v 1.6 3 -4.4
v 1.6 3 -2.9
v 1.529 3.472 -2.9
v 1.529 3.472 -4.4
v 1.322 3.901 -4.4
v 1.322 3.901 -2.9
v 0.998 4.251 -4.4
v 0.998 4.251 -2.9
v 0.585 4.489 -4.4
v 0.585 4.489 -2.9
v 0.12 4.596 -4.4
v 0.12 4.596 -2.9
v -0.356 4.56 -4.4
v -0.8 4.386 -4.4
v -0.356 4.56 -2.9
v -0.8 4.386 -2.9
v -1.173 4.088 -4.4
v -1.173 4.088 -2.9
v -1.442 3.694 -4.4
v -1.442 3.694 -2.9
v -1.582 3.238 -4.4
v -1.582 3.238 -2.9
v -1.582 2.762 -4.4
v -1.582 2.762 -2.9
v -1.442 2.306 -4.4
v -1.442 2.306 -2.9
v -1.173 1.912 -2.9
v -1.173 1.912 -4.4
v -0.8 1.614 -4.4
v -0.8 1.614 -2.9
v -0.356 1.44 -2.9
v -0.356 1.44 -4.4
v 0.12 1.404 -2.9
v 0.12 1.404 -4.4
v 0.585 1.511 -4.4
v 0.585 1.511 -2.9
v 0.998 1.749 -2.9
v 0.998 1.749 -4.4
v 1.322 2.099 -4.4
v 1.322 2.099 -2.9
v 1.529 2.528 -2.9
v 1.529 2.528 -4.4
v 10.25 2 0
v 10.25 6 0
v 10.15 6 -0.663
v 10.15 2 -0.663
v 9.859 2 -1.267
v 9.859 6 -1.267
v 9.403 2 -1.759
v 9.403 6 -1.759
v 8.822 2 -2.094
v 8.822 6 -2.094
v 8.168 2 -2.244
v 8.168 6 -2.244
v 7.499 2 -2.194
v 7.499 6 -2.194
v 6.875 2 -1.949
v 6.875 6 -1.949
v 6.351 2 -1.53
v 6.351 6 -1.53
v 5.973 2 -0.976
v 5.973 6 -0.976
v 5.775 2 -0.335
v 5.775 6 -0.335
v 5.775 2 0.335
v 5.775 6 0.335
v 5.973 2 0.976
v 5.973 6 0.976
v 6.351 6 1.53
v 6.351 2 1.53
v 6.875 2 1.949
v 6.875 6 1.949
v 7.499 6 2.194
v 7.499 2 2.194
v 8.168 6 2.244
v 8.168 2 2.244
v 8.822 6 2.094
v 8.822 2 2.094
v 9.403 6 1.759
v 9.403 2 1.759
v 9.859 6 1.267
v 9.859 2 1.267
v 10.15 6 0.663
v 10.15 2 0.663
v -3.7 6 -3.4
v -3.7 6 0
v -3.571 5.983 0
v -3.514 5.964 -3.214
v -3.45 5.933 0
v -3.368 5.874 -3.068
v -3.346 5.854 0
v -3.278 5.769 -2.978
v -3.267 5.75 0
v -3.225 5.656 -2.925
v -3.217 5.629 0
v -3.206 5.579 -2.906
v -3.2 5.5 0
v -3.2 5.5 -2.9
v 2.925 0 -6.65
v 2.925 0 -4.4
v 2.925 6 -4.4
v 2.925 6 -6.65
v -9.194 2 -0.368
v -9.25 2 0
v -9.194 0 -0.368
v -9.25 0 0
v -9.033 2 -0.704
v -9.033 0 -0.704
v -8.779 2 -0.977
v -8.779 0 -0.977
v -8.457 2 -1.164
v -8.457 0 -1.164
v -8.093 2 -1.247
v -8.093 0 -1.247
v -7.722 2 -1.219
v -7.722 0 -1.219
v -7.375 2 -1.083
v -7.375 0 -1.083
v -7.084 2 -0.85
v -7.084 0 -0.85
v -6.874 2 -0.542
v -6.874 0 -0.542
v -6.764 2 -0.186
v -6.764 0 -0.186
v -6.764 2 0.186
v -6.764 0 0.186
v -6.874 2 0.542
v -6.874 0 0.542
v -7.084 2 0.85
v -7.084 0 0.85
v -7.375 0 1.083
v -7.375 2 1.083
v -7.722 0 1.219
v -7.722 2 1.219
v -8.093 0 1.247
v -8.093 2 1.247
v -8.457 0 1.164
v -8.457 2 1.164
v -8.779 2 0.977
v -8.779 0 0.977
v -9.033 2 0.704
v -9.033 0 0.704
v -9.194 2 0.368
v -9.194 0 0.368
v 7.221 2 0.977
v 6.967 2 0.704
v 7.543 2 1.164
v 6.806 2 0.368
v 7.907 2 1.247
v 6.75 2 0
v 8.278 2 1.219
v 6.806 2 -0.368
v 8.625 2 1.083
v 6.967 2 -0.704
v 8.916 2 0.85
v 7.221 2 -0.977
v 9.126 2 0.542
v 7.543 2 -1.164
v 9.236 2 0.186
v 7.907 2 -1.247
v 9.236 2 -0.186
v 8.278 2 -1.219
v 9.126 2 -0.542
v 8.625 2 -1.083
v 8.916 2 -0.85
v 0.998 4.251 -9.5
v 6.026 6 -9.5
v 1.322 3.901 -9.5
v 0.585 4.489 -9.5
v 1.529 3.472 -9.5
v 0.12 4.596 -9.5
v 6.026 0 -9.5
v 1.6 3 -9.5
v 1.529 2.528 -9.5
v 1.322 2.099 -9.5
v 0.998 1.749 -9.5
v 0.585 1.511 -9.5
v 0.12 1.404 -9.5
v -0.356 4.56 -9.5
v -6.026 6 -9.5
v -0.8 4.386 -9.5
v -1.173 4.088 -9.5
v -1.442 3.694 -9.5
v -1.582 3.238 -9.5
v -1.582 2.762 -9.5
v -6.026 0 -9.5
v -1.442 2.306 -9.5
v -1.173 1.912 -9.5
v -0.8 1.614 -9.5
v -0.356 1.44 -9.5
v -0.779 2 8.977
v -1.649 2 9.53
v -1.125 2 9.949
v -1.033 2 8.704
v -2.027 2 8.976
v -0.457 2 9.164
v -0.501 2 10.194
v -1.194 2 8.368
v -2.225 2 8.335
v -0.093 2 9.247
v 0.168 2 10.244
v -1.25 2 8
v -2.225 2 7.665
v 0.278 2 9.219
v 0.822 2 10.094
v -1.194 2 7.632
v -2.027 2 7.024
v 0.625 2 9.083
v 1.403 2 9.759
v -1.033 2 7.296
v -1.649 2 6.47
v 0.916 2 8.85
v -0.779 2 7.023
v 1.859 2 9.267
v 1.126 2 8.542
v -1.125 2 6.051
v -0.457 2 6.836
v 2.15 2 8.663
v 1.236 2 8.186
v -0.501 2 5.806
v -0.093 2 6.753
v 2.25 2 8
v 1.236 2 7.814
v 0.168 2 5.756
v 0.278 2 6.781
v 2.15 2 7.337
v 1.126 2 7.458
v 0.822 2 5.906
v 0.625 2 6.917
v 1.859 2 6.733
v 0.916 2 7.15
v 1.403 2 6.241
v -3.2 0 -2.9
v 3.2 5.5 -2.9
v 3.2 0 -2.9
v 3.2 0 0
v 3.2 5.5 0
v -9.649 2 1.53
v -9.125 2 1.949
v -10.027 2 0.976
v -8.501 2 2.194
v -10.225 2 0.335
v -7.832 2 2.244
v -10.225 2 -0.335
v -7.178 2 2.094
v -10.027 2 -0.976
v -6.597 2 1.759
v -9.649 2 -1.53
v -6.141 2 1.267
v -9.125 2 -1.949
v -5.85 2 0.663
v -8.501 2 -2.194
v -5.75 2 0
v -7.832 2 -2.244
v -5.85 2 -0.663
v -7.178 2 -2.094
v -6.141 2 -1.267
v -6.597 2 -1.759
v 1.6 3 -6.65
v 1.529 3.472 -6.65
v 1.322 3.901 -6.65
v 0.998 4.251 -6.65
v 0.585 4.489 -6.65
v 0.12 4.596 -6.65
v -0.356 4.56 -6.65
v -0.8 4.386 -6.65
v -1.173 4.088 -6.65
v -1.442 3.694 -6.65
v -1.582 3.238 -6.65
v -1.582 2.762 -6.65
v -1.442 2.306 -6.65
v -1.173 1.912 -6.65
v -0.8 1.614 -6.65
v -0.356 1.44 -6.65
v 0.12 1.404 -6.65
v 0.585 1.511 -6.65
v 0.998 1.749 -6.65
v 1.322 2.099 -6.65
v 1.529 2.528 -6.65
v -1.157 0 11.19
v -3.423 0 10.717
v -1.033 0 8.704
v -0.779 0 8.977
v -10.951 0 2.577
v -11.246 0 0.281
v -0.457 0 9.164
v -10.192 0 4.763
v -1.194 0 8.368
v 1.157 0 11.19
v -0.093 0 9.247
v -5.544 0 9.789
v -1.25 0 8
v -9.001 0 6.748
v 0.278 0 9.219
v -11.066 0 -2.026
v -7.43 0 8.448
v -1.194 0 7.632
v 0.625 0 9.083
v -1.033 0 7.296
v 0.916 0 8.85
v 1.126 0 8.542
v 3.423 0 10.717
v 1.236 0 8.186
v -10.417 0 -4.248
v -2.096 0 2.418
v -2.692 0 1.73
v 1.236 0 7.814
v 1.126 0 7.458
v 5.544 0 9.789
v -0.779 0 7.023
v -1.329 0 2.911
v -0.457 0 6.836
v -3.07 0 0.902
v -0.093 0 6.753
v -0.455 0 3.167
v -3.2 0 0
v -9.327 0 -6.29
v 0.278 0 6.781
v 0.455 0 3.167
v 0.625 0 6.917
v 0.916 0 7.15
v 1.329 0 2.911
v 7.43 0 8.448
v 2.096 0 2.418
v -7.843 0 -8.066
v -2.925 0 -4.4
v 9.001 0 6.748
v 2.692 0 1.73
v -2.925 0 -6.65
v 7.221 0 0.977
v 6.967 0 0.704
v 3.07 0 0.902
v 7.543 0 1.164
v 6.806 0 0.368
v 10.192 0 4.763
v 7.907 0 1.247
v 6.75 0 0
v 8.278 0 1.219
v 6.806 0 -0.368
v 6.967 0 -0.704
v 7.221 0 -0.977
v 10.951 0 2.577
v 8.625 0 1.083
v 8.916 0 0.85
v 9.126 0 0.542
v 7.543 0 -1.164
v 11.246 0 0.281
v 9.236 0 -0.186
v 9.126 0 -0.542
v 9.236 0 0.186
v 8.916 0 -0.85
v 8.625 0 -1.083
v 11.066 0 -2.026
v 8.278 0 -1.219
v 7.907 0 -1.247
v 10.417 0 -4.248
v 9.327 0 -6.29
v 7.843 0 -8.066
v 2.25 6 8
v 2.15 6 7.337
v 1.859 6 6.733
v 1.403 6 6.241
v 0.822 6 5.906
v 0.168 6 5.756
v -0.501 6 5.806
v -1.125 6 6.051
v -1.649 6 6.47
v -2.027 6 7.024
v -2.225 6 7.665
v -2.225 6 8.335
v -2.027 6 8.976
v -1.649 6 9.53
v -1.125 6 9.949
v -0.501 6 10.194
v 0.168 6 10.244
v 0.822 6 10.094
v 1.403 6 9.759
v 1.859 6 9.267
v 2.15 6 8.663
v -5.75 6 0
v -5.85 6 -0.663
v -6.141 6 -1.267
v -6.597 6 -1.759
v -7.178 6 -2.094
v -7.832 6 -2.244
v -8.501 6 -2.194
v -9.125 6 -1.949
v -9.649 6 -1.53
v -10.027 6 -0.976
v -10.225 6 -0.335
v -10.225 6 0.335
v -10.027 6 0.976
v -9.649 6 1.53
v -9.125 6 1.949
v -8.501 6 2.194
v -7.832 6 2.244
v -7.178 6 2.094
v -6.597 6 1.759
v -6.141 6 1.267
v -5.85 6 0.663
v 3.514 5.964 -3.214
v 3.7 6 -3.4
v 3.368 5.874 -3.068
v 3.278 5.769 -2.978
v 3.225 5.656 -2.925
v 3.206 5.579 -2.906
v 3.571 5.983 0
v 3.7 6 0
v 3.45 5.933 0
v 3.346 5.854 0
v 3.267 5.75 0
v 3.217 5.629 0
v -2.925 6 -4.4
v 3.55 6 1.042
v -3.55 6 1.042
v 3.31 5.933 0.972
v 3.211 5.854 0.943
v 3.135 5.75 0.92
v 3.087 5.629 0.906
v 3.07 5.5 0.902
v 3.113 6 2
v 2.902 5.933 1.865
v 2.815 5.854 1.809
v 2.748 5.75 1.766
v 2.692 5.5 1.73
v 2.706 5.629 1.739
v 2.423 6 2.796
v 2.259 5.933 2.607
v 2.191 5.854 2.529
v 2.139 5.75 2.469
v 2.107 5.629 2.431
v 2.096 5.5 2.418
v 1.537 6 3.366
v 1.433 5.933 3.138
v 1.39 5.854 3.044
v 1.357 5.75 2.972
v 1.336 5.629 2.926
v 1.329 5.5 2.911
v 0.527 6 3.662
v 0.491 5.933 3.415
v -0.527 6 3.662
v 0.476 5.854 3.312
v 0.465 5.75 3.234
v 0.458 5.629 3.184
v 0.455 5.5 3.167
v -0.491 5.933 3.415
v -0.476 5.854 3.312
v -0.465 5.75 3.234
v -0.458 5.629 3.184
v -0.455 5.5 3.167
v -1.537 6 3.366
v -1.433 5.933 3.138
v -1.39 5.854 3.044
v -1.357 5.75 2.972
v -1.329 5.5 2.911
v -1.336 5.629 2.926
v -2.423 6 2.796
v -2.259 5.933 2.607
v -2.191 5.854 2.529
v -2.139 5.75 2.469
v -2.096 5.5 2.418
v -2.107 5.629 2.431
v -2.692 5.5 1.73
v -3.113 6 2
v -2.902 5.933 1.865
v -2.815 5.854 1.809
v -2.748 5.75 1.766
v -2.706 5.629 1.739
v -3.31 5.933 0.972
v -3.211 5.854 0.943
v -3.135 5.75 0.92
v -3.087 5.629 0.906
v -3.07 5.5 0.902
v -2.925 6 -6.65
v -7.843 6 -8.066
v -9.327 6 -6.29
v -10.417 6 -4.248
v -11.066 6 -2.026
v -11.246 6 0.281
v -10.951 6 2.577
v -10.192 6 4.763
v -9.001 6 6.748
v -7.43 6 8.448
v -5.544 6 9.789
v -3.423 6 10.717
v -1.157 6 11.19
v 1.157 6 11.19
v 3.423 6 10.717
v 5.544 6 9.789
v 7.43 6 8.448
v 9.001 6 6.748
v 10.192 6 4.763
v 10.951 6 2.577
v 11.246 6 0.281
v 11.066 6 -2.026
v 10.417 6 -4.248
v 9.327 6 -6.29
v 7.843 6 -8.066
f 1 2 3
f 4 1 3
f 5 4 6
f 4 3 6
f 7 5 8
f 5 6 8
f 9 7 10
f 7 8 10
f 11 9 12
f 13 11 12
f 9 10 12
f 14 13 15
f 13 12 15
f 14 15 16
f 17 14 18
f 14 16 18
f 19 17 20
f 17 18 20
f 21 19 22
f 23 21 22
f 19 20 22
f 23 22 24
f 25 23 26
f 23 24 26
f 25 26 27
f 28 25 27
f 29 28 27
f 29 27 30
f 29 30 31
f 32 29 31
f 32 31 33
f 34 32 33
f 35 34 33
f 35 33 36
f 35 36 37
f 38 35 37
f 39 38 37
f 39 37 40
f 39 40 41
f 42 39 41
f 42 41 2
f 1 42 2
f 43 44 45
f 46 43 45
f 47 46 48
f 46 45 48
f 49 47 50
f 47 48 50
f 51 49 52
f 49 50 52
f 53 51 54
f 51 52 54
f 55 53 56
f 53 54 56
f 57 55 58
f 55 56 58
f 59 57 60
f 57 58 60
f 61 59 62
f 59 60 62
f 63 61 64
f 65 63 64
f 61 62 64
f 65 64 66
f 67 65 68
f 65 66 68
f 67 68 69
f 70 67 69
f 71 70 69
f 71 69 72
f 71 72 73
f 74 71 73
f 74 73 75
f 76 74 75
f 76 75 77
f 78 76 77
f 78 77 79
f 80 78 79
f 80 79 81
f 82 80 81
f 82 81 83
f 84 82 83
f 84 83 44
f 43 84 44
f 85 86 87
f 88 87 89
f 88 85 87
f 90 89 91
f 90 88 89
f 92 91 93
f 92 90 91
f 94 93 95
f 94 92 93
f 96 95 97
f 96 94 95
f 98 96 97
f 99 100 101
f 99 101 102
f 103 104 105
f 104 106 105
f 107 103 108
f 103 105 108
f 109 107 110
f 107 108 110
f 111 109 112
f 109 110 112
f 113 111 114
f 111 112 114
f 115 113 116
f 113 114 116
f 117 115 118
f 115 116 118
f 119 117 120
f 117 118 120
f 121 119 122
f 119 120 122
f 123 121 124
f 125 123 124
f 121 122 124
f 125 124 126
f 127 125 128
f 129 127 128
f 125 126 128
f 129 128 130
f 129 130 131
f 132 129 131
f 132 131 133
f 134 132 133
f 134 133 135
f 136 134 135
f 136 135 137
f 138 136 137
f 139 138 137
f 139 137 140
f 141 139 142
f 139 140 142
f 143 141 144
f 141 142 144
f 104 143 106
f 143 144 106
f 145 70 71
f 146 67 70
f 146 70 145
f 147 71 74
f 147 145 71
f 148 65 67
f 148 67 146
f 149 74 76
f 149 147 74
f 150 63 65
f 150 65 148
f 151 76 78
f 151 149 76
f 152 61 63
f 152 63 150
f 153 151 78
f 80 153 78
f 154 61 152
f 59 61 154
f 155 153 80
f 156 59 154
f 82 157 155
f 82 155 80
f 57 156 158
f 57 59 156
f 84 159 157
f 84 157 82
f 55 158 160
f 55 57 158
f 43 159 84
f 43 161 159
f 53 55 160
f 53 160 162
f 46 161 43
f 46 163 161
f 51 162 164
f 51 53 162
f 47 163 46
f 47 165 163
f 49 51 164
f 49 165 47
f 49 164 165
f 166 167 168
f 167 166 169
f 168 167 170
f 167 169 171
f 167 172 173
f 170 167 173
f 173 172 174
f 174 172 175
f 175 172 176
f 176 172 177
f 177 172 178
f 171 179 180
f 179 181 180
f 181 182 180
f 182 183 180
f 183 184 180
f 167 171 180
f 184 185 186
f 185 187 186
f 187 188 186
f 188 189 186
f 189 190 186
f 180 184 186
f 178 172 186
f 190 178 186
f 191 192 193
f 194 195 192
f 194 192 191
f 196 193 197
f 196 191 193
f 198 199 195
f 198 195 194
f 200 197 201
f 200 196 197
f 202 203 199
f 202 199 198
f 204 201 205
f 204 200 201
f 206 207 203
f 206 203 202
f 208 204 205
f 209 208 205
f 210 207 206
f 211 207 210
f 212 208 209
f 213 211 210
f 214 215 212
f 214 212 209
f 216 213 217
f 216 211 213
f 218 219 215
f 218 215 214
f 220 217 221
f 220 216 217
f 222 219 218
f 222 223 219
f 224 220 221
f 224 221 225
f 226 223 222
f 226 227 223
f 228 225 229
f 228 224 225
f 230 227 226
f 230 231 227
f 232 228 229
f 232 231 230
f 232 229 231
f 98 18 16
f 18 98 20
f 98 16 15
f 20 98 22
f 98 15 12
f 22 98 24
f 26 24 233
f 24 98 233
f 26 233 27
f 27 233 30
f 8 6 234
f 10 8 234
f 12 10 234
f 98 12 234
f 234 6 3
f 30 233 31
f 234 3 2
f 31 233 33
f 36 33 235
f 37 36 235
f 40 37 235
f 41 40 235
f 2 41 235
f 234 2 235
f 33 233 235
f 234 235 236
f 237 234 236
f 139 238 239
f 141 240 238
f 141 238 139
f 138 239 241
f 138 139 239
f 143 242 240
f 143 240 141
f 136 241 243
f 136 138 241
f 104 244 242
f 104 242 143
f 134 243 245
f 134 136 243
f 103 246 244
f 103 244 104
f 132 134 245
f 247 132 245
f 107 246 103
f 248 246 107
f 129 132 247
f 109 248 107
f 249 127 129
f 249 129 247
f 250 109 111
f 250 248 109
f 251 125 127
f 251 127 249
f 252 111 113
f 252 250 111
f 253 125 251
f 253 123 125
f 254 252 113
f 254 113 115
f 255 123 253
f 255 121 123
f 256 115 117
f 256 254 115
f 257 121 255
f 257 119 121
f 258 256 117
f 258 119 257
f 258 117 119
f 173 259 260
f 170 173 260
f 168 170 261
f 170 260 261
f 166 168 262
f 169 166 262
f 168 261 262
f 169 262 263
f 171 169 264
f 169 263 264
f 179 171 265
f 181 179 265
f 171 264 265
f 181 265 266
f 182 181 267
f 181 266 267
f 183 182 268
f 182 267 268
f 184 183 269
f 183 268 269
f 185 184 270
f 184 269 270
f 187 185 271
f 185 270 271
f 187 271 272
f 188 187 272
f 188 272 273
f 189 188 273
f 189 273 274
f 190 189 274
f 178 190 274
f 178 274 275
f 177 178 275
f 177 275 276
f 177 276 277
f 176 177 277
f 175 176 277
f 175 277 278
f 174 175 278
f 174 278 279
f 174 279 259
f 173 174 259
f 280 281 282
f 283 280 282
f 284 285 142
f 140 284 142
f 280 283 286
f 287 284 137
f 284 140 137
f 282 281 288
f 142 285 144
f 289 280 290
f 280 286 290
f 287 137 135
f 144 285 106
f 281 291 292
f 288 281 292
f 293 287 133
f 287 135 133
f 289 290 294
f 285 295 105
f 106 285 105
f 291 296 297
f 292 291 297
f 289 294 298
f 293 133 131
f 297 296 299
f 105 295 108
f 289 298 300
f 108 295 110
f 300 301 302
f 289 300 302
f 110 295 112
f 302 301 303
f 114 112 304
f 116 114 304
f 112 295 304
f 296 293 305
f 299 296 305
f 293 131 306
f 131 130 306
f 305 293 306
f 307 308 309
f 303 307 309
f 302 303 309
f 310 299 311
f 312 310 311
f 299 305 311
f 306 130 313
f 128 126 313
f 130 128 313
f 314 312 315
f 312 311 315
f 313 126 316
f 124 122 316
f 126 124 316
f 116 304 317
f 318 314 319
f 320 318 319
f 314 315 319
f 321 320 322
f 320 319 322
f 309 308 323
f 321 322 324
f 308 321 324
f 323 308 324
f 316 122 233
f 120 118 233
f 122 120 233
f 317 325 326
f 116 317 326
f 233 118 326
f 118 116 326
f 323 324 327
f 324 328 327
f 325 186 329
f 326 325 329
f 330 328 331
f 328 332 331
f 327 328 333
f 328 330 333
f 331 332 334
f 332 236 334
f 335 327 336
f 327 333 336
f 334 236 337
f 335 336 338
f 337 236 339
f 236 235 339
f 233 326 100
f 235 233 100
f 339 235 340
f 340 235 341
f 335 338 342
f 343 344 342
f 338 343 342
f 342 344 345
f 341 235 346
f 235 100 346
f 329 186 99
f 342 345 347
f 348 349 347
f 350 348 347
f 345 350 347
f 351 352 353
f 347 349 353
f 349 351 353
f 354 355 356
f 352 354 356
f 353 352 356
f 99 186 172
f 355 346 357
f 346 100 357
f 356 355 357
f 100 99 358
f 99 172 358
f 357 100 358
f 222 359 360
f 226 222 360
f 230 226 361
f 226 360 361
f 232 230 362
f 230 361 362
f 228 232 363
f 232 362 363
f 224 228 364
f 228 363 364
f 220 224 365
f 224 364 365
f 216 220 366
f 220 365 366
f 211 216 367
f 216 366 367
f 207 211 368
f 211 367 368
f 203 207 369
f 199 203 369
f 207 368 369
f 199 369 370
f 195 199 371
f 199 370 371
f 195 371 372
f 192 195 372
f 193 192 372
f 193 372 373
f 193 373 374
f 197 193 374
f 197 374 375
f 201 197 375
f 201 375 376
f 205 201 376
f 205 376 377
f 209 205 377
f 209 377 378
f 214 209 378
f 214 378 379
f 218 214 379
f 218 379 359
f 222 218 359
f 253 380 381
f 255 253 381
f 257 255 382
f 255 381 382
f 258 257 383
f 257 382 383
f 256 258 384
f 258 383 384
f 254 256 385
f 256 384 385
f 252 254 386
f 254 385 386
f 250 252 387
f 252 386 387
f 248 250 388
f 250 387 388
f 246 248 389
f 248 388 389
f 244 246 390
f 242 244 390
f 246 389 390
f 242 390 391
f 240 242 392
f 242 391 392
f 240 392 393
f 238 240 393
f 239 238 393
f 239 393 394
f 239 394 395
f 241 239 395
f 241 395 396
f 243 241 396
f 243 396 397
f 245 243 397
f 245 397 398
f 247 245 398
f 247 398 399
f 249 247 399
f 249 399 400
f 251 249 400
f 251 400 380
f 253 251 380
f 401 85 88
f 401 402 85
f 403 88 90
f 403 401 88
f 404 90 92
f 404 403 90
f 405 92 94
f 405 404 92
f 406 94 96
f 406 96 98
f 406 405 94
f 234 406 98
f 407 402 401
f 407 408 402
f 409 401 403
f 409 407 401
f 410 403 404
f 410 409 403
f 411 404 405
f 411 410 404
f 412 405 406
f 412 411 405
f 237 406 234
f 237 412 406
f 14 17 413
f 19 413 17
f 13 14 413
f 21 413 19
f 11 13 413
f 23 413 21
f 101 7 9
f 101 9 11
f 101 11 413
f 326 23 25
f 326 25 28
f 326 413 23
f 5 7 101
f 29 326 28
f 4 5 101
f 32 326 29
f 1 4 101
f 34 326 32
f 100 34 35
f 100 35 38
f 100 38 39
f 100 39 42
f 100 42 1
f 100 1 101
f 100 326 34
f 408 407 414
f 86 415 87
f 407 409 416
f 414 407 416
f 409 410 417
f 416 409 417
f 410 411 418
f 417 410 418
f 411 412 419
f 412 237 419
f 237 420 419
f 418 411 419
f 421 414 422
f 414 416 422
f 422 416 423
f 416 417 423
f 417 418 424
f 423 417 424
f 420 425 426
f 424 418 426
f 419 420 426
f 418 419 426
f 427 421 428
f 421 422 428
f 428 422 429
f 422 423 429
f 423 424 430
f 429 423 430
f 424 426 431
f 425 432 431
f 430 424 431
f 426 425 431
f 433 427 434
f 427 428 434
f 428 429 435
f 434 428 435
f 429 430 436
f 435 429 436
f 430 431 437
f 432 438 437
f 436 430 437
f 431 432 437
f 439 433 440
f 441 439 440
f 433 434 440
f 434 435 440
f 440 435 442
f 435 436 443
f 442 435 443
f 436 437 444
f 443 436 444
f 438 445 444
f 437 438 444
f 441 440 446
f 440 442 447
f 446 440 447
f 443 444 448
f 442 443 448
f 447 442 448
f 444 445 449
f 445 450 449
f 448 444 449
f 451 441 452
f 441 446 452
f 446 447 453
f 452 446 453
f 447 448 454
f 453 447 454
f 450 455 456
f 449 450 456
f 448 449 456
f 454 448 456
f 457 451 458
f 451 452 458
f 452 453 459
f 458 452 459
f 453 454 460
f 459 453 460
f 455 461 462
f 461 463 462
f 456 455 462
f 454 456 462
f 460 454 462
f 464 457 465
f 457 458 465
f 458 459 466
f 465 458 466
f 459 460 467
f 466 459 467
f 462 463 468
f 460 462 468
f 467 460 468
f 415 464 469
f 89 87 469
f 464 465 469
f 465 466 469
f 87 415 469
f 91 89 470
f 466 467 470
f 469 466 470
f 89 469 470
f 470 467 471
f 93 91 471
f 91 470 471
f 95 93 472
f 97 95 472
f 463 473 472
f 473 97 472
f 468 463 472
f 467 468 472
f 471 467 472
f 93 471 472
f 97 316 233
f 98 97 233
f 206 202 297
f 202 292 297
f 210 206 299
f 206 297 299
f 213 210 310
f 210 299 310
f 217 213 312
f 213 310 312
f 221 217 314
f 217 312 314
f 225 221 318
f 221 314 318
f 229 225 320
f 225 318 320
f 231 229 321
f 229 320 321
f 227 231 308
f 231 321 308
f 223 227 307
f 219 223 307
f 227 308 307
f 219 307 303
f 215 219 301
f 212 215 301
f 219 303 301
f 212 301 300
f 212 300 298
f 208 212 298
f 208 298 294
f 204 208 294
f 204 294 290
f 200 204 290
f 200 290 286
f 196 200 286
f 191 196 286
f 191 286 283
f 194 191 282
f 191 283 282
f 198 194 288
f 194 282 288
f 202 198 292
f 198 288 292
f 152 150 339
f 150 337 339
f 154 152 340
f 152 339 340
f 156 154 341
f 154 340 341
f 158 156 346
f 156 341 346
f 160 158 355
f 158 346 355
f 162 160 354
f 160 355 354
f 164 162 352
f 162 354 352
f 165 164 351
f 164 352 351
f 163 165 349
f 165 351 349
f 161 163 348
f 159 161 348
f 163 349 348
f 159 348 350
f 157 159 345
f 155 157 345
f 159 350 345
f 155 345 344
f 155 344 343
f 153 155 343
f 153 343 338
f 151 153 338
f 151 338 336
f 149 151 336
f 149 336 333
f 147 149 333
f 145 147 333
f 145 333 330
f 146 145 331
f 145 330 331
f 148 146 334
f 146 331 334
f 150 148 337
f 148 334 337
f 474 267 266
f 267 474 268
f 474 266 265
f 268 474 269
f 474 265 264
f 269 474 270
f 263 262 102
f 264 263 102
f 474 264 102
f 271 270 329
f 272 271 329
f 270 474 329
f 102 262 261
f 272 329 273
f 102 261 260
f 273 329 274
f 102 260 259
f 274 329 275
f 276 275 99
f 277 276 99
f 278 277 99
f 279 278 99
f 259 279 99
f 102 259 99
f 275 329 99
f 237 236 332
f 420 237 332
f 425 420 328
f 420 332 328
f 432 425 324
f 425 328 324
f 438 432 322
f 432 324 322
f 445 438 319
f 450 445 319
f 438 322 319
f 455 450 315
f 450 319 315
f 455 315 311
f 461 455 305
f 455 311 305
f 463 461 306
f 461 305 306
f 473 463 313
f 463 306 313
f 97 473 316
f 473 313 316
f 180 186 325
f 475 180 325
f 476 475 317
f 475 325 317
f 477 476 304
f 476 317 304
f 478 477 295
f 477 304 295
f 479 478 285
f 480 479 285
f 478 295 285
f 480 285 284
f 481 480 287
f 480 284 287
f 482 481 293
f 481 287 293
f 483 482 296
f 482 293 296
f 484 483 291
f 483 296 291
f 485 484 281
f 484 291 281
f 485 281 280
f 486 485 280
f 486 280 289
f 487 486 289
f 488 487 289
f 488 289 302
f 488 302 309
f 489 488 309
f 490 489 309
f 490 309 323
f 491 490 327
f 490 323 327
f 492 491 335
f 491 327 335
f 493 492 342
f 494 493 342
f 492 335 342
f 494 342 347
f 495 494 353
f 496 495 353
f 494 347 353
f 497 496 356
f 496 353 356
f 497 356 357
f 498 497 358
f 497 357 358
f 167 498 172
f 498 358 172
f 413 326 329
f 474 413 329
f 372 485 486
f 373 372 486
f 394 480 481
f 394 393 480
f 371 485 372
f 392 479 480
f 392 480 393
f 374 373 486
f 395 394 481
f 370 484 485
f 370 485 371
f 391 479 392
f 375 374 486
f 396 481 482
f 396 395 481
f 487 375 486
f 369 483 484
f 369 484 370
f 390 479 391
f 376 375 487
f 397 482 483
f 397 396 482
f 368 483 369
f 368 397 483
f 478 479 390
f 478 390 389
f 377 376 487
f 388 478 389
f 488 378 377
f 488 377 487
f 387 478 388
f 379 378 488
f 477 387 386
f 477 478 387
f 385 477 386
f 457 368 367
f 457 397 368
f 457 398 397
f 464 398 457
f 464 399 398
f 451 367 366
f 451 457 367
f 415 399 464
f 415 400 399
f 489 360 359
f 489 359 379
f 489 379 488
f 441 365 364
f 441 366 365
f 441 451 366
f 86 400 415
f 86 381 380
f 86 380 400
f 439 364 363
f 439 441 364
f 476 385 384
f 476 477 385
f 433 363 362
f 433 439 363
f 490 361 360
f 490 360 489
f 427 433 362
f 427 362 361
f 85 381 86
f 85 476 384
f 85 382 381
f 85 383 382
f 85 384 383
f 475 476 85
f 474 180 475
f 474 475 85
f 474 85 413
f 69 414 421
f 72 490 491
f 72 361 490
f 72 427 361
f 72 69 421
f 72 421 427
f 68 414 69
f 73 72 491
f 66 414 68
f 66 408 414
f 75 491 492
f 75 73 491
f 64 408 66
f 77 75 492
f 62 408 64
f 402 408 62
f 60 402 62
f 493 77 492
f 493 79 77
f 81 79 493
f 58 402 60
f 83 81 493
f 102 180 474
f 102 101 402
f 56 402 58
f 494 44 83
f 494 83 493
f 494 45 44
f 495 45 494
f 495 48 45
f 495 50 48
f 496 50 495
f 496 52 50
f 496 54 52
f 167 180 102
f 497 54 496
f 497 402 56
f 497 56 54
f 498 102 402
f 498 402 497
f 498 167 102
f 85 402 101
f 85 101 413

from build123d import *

# Parameters (mm, degrees)
BOSS_EXTRU_1_DEPTH             = 6
CBORE_FOR_M2_SHCS1_D           = 2.5
CBORE_FOR_M2_SHCS1_CBORE_D     = 4.5
CBORE_FOR_M2_SHCS1_CBORE_DEPTH = 4
CONG_1_R                       = 0.5
ESQUISSE6_R                    = 1.6
ENL_V_MAT_EXTRU_1_DEPTH        = 18.003676108
ESQUISSE7_W                    = 5.85
ESQUISSE7_H                    = 2.25
ENL_V_MAT_EXTRU_2_DEPTH        = 7.25


with BuildPart() as part:
    # Esquisse1 → Boss.-Extru.1 (new body)
    with BuildSketch(Plane(origin=(0, 0, 0), x_dir=(1, 0, 0), z_dir=(0, 1, 0))):
        with BuildLine():
            Line((6.025985397, 9.5), (-6.025985397, 9.5))
            ThreePointArc((-6.025985397, 9.5), (0, -11.25), (6.025985397, 9.5))
        make_face()
        with BuildLine():
            Line((-3.2, 0), (-3.2, 2.9))
            Line((-3.2, 2.9), (3.2, 2.9))
            Line((3.2, 2.9), (3.2, 0))
            ThreePointArc((3.2, 0), (0, -3.2), (-3.2, 0))
        make_face(mode=Mode.SUBTRACT)
    extrude(amount=BOSS_EXTRU_1_DEPTH)

    # CBORE for M2 SHCS1 (through all)
    with Locations(Plane(origin=(0, 6, 0), x_dir=(1, 0, 0), z_dir=(0, 1, 0))):
        with Locations((8, 0), (-8, 0), (0, 0), (0, -8)):
            CounterBoreHole(CBORE_FOR_M2_SHCS1_D / 2, CBORE_FOR_M2_SHCS1_CBORE_D / 2, CBORE_FOR_M2_SHCS1_CBORE_DEPTH)

    # Congé1
    cong_1_edges = [part.edges().sort_by_distance(p)[0] for p in [
        (0, 6, 3.2),
        (3.2, 6, -1.45),
        (0, 6, -2.9),
        (-3.2, 6, -1.45),
    ]]
    fillet(cong_1_edges, radius=CONG_1_R)

    # Esquisse6 → Enlèv. mat.-Extru.1 (cut, through all)
    with BuildSketch(Plane.XY):
        with Locations((0, 3)):
            Circle(ESQUISSE6_R)
    extrude(amount=-ENL_V_MAT_EXTRU_1_DEPTH, mode=Mode.SUBTRACT)

    # Esquisse7 → Enlèv. mat.-Extru.2 (cut)
    with BuildSketch(Plane(origin=(0, 0, 0), x_dir=(1, 0, 0), z_dir=(0, 1, 0))):
        with Locations((0, 5.525)):
            Rectangle(ESQUISSE7_W, ESQUISSE7_H)
    extrude(amount=ENL_V_MAT_EXTRU_2_DEPTH, mode=Mode.SUBTRACT)


solid = part.part
